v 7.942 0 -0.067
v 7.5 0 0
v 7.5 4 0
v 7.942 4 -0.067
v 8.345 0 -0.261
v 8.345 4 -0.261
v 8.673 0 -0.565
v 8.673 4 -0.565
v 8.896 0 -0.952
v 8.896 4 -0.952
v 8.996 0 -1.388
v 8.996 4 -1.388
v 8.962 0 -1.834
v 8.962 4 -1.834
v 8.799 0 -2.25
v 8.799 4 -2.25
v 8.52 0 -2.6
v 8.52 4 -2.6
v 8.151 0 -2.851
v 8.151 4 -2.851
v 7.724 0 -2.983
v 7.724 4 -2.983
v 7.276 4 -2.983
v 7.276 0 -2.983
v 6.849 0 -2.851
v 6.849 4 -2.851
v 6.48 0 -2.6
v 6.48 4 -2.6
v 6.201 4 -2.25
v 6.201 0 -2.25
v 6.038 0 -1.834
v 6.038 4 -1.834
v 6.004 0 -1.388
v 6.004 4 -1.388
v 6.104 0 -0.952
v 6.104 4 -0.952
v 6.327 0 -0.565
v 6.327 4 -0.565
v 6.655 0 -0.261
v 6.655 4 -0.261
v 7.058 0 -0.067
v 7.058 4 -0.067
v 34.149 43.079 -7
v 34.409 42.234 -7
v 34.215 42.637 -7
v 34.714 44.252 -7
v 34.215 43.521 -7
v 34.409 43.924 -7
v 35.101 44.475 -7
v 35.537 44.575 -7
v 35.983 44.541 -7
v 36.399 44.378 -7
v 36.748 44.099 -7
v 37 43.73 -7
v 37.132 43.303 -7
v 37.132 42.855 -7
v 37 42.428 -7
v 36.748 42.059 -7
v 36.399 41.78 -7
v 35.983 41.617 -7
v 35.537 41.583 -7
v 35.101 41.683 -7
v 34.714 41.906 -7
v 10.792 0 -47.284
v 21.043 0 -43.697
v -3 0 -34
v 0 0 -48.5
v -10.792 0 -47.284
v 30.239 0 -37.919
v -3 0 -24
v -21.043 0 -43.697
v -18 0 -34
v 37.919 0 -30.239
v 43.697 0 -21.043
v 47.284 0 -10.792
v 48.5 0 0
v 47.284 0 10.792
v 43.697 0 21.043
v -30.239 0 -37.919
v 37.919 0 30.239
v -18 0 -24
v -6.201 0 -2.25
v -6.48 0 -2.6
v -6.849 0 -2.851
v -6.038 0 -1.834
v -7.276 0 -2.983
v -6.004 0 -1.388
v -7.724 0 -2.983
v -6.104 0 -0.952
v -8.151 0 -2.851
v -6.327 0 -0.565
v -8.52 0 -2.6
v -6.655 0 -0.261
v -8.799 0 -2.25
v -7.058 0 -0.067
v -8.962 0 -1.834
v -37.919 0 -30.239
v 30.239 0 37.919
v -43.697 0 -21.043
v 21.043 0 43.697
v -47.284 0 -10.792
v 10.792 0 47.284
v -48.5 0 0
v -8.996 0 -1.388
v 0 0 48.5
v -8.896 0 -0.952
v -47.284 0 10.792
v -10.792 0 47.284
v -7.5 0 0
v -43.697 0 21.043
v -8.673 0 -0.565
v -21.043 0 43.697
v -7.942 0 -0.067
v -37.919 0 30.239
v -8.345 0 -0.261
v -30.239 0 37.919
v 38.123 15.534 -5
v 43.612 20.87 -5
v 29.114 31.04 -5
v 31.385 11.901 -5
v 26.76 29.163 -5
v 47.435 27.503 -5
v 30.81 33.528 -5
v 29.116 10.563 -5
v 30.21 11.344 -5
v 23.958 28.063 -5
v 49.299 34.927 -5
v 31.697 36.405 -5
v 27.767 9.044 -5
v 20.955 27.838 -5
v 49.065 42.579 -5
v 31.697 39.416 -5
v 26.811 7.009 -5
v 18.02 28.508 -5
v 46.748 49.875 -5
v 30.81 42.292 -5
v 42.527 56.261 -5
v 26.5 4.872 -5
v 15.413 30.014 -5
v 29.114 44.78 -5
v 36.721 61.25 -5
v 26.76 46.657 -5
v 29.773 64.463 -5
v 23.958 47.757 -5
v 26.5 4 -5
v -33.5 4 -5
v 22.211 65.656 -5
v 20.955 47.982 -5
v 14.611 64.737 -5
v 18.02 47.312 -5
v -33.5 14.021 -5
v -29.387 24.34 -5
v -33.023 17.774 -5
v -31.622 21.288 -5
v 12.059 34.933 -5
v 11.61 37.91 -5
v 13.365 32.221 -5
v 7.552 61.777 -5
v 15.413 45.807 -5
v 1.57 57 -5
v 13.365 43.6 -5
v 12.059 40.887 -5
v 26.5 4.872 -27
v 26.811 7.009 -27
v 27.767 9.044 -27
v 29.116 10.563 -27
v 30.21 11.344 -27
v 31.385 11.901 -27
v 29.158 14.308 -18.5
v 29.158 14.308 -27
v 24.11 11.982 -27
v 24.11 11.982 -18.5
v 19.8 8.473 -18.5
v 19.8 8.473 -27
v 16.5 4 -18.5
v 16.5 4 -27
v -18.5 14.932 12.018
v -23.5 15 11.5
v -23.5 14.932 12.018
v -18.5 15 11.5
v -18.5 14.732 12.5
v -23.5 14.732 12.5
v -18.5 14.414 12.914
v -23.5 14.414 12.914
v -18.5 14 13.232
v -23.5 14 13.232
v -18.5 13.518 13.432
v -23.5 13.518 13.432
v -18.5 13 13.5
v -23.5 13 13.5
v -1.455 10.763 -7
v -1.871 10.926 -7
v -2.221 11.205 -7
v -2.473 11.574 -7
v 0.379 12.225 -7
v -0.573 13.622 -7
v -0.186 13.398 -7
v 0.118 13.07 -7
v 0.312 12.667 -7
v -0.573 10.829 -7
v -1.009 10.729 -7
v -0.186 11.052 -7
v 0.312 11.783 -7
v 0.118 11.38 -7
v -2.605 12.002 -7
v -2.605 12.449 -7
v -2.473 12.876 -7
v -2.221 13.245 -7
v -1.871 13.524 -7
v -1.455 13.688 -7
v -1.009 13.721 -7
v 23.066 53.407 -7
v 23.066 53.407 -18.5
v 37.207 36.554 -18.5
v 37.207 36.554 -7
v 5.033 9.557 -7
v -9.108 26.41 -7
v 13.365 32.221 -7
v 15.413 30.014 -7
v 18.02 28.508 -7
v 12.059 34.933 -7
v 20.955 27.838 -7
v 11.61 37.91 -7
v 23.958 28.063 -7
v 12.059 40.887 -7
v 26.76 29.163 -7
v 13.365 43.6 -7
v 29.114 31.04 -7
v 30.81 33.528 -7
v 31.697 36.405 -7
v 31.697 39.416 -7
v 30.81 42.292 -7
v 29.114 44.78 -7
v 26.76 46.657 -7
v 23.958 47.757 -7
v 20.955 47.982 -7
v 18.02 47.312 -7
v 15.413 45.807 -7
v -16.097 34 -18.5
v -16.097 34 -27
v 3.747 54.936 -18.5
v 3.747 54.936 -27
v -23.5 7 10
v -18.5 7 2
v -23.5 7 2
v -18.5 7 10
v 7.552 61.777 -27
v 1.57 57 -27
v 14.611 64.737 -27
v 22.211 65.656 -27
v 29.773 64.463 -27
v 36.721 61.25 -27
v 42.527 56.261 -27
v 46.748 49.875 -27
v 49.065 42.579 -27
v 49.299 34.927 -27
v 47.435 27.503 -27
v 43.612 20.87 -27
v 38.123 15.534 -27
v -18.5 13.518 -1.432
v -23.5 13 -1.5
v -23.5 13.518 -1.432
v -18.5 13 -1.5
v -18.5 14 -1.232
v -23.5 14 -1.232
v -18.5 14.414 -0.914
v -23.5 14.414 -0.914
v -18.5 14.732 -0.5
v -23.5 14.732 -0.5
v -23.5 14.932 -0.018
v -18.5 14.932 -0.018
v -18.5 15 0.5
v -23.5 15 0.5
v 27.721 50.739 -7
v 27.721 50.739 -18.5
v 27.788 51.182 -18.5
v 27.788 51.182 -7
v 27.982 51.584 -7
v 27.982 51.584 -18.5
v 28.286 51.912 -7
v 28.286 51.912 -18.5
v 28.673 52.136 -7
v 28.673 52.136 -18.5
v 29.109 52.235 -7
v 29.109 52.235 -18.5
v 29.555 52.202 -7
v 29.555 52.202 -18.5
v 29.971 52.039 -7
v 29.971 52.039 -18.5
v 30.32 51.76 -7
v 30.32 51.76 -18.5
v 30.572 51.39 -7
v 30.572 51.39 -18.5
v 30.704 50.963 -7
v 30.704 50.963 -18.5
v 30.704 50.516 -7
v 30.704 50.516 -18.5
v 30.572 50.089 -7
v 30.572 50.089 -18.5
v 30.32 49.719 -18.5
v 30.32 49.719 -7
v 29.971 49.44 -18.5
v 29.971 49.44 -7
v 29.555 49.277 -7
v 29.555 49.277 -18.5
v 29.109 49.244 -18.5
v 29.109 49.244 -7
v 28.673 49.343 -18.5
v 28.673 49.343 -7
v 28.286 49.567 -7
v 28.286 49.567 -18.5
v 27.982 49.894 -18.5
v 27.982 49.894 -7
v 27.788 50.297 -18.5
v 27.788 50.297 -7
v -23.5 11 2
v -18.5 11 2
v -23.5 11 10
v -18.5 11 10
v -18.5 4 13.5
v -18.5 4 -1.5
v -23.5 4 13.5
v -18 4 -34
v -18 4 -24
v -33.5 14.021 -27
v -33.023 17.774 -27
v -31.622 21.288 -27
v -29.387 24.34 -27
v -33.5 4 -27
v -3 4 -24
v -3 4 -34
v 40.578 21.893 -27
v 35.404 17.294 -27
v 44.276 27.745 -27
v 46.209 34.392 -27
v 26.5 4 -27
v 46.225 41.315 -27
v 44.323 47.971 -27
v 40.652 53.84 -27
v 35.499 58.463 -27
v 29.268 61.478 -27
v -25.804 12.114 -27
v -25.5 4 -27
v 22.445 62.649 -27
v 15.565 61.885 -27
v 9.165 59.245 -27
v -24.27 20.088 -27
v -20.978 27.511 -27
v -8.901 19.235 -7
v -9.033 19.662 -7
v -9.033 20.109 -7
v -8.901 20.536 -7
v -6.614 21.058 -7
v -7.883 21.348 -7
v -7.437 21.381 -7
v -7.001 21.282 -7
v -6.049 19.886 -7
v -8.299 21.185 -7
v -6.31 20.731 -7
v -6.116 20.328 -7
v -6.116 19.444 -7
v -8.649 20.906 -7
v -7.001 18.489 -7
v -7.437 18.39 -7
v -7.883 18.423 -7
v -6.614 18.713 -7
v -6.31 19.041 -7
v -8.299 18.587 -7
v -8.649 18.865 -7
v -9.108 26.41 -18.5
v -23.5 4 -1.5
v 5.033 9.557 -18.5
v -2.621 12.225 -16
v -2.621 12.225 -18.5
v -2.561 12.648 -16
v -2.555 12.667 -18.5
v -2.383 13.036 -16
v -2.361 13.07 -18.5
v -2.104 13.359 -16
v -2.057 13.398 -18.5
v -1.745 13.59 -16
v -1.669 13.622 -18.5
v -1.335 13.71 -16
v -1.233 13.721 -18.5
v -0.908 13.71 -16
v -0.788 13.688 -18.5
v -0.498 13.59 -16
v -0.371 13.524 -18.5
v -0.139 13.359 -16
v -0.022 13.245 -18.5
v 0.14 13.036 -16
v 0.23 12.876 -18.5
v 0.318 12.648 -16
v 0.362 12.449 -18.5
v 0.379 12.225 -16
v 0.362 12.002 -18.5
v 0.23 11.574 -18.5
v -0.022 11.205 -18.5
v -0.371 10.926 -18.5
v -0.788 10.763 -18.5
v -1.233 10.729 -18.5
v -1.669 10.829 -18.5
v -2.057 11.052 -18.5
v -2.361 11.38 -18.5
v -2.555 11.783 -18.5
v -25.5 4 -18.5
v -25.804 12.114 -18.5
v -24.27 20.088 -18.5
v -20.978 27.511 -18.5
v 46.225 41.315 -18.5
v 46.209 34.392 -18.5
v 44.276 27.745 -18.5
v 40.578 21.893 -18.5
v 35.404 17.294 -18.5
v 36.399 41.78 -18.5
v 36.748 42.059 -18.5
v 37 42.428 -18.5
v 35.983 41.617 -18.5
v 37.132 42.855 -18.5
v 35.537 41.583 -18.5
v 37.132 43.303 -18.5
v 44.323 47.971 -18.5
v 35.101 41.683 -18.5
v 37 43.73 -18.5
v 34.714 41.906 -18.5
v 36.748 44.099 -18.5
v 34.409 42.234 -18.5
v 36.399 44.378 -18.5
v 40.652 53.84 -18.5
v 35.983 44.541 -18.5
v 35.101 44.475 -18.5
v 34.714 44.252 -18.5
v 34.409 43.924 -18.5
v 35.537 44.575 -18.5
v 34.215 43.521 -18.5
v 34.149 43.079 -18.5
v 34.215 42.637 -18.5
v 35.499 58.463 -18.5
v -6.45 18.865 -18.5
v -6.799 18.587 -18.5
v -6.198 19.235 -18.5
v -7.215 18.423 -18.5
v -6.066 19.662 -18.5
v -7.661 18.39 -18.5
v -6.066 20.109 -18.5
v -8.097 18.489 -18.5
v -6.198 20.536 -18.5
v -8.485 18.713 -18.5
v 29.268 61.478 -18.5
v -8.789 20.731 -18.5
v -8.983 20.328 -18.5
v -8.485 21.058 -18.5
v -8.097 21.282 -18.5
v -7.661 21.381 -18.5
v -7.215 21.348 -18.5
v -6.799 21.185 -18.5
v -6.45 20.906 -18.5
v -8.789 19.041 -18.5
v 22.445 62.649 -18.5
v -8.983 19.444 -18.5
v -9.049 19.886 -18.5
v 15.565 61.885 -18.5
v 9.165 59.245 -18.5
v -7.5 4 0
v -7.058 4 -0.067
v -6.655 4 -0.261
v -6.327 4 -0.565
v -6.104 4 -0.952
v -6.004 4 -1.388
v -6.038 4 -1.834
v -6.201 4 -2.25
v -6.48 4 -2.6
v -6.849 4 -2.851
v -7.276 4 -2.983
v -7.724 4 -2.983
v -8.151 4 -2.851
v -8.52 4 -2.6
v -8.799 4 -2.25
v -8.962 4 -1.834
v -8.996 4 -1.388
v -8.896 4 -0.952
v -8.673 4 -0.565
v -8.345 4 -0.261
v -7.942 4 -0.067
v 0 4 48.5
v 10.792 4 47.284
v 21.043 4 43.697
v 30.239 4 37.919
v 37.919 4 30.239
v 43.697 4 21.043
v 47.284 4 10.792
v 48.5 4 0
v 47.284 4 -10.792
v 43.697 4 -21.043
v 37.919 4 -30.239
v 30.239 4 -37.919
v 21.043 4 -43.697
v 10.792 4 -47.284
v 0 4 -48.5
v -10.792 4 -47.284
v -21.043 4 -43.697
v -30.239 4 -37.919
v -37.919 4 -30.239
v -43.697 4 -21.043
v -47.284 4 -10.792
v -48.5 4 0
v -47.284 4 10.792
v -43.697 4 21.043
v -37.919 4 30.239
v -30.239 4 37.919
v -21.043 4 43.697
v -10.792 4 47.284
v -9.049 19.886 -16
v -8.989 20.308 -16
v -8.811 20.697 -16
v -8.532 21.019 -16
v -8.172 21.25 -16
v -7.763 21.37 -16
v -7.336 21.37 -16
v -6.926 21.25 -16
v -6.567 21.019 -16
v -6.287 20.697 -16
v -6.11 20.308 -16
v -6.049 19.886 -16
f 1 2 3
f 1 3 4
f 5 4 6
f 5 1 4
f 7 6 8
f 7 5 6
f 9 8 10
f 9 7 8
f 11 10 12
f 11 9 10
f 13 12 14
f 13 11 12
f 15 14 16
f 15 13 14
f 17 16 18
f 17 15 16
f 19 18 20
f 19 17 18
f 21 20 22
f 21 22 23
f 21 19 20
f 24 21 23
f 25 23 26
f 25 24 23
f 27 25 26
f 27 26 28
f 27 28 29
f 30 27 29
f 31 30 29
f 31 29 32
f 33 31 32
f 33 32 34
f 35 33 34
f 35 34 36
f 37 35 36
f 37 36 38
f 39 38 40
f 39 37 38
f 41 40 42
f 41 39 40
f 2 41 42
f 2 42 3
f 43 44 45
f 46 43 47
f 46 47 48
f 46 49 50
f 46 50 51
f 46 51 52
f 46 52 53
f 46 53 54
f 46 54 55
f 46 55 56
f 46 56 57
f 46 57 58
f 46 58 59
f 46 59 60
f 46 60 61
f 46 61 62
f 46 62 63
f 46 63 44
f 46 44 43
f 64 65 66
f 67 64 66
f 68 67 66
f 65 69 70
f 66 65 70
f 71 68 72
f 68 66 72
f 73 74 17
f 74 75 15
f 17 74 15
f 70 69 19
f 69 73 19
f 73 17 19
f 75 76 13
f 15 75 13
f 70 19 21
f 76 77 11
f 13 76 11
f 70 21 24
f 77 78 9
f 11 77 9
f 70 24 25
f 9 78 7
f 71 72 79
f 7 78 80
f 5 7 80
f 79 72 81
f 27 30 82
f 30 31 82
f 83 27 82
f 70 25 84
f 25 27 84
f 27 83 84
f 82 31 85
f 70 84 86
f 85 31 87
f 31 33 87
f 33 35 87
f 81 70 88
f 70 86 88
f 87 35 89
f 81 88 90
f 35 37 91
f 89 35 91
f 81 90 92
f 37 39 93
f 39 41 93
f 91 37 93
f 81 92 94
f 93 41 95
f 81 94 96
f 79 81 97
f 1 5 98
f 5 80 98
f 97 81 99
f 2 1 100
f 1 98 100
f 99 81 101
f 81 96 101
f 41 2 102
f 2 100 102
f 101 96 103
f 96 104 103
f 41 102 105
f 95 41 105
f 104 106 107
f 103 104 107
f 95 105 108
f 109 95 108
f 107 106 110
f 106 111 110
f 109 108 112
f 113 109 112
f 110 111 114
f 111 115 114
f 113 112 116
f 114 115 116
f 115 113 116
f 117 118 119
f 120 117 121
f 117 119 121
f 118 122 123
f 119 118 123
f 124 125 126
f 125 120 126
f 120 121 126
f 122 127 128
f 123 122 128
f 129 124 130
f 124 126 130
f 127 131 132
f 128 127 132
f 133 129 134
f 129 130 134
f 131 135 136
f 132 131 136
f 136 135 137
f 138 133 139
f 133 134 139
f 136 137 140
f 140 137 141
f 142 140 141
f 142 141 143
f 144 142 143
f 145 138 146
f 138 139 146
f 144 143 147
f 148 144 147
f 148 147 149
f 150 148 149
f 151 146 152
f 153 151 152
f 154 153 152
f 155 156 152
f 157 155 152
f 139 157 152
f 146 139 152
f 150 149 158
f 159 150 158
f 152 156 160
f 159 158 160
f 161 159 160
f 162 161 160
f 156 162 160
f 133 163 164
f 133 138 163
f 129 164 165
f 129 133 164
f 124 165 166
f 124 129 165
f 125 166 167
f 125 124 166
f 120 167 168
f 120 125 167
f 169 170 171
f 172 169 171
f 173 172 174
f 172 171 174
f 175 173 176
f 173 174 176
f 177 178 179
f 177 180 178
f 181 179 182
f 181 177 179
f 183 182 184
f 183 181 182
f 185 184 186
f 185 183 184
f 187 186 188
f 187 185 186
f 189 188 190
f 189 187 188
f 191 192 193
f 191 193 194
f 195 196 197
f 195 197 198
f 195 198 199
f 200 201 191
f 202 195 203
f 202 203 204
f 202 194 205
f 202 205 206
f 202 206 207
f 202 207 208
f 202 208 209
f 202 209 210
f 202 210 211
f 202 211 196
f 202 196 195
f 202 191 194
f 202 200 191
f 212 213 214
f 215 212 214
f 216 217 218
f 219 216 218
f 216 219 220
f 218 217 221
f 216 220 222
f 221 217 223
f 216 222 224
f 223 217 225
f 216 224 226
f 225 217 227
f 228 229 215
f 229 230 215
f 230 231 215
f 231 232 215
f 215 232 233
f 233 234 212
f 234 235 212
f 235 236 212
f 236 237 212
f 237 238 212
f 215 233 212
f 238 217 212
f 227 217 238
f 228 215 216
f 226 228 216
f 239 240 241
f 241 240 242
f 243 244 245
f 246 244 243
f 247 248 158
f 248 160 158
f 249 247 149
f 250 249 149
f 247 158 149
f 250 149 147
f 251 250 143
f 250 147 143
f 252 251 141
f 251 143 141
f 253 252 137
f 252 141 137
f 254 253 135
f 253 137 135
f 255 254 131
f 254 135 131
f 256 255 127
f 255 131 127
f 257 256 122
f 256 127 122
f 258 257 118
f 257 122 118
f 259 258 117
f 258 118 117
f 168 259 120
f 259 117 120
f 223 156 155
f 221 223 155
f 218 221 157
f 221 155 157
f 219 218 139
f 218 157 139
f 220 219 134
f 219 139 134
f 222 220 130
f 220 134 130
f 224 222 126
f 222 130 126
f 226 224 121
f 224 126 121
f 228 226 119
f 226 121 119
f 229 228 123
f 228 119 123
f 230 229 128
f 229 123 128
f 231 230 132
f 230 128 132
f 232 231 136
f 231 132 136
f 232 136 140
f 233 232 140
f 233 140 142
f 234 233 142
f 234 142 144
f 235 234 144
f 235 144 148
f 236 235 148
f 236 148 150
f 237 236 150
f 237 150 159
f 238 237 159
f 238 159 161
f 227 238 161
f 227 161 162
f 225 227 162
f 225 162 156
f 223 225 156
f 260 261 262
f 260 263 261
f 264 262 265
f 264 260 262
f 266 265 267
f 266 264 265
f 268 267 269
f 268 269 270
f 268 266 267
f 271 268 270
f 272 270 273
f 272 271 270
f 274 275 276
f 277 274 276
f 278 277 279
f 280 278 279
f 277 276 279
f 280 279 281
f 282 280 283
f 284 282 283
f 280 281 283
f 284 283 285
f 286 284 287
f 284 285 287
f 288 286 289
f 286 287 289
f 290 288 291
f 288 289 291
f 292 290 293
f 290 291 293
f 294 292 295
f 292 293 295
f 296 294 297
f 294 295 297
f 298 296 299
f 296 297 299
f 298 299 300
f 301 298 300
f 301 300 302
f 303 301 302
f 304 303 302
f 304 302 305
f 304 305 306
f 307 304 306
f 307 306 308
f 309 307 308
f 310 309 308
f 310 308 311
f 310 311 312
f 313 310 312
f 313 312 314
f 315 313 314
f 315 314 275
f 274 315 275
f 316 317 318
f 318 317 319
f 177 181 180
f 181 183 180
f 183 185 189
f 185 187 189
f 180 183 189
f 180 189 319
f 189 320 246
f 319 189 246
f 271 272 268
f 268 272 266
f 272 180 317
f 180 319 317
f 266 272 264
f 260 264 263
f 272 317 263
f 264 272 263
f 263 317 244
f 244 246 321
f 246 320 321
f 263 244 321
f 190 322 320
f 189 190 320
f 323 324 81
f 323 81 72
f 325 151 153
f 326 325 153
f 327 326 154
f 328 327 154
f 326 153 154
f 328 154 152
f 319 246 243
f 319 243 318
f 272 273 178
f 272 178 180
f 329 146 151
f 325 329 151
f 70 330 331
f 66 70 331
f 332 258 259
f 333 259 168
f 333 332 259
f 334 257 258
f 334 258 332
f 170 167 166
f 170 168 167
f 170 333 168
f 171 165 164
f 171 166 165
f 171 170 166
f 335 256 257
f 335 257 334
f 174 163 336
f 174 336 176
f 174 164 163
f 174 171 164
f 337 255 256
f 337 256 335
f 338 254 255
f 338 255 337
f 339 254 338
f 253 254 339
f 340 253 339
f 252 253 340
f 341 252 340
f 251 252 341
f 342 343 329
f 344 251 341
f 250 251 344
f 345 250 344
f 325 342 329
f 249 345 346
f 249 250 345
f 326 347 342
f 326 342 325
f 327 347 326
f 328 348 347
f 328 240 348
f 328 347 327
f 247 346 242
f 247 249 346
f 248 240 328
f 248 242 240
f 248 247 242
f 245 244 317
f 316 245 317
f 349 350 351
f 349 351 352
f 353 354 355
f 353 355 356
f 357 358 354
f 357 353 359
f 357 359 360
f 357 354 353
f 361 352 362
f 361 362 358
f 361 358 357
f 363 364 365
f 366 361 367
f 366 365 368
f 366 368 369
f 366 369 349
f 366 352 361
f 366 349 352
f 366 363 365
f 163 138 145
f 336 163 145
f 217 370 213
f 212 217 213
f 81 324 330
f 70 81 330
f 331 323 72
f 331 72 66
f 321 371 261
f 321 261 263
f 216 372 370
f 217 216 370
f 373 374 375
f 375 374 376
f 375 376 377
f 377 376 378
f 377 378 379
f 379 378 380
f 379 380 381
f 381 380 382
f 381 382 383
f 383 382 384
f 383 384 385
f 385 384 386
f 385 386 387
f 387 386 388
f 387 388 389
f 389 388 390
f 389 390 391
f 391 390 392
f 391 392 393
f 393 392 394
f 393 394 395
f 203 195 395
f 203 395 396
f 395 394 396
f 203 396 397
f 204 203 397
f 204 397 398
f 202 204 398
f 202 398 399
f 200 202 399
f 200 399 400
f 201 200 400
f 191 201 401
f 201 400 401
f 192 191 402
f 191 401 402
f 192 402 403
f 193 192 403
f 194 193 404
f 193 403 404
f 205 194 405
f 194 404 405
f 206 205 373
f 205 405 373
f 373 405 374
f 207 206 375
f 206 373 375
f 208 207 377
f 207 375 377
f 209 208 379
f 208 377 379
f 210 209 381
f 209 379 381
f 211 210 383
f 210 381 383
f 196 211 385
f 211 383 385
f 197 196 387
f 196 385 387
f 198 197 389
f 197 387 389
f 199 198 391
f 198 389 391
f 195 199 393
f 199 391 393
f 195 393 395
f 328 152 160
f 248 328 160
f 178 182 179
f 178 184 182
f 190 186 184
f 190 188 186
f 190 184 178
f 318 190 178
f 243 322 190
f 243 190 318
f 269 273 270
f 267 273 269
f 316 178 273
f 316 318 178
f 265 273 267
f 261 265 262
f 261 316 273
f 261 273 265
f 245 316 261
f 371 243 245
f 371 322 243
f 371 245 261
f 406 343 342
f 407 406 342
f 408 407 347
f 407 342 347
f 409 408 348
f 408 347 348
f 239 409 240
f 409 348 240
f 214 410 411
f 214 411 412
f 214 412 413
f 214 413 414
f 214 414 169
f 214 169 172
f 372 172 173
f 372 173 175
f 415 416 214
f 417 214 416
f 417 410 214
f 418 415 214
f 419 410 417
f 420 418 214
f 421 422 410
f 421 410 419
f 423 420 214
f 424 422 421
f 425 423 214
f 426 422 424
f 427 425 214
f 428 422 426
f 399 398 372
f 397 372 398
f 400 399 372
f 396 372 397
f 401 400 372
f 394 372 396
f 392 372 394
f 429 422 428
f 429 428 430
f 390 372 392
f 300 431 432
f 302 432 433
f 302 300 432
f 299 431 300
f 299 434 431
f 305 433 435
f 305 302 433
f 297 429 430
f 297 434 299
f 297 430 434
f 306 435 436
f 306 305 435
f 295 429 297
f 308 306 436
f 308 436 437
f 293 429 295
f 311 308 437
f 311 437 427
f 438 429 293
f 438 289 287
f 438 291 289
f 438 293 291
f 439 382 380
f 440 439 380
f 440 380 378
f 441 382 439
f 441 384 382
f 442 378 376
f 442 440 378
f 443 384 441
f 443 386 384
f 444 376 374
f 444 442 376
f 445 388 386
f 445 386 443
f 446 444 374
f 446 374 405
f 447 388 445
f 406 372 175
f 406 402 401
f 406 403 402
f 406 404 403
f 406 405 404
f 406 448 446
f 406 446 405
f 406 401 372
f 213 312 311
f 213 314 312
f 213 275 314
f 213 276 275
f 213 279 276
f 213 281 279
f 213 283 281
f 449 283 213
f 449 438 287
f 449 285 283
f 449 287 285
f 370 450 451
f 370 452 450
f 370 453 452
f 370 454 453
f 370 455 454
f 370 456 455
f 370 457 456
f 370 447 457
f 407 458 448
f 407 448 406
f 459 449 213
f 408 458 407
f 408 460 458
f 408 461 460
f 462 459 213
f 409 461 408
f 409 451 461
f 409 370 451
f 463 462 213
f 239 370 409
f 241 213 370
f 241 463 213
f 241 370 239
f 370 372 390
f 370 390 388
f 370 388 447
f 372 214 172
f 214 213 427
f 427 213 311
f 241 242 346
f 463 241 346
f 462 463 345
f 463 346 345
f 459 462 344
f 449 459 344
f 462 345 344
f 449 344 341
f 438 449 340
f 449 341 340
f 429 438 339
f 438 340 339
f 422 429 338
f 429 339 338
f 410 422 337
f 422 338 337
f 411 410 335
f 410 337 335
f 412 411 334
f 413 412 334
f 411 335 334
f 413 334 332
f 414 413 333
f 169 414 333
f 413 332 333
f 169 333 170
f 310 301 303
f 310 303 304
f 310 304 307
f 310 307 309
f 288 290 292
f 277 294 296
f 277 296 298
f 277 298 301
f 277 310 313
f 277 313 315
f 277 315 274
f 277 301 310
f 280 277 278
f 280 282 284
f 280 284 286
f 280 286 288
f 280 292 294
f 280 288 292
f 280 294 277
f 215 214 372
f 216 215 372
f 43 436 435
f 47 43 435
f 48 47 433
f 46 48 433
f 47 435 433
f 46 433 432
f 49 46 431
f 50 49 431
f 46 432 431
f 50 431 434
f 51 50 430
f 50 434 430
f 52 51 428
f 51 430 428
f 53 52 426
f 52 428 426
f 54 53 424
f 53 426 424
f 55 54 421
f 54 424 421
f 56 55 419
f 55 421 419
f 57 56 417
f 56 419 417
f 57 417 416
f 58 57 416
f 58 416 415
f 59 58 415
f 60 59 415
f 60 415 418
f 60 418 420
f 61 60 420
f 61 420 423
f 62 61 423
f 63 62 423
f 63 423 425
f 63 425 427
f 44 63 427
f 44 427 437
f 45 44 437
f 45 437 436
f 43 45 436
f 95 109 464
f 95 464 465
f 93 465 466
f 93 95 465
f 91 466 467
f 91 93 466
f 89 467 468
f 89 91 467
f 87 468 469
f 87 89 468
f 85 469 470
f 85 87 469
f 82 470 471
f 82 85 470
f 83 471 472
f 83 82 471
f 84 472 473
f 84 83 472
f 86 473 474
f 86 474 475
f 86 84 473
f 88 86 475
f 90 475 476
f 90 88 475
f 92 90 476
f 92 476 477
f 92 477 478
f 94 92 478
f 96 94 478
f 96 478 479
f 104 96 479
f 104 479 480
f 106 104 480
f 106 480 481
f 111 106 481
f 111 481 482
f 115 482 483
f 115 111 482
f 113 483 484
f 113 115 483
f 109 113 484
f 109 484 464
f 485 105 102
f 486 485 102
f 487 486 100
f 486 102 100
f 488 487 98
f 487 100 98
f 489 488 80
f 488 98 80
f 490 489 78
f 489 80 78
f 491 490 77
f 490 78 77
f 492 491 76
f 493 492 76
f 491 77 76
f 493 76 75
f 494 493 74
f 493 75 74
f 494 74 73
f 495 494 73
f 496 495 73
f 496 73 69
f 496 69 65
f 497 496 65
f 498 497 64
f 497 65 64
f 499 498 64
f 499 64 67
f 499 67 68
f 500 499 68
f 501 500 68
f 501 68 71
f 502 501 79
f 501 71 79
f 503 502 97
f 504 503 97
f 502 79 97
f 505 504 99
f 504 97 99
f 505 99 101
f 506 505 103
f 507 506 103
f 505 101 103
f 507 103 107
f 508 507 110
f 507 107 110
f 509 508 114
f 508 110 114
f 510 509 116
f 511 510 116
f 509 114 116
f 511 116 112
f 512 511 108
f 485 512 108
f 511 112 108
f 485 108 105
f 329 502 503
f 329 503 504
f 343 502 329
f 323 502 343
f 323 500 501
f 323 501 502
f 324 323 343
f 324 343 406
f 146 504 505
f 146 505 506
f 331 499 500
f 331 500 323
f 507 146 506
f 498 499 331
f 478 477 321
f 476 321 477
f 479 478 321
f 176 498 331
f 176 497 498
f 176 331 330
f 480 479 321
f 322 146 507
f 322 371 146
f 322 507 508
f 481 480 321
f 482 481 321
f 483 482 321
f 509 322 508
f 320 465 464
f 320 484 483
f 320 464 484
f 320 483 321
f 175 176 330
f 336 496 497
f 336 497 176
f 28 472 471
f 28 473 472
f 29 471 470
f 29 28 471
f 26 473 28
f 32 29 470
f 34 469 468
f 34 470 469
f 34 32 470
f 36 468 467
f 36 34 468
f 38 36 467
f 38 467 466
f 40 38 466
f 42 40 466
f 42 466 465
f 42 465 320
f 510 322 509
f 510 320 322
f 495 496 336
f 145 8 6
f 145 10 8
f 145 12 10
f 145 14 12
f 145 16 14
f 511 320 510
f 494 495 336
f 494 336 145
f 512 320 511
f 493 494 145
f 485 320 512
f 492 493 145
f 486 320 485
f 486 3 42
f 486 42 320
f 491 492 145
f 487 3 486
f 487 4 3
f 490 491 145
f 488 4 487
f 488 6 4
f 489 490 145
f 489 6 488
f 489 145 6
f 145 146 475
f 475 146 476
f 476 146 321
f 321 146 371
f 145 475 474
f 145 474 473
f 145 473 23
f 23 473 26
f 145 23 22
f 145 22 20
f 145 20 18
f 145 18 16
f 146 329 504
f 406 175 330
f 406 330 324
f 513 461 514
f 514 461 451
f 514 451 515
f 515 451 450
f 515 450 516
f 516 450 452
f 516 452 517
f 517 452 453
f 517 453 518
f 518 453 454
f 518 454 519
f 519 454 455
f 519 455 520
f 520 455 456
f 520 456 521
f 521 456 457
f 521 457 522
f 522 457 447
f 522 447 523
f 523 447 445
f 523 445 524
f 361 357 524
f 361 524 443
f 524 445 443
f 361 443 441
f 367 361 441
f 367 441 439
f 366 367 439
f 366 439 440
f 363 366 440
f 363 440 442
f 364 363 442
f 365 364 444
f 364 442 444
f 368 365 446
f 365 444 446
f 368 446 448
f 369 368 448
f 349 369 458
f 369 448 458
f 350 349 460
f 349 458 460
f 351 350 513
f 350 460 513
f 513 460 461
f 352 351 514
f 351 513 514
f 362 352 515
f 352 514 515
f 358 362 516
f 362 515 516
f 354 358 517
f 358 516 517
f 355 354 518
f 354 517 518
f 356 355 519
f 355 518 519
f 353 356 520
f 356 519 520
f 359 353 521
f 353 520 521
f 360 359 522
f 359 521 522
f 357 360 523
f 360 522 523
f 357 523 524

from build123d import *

# Parameters (mm, degrees)
SKETCH1_R               = 48.5
SKETCH1_R_2             = 1.5
SKETCH1_W               = 5
SKETCH1_H               = 15
BOSS_EXTRUDE1_DEPTH     = 4
SKETCH1_4_W             = 5
SKETCH1_4_H             = 15
BOSS_EXTRUDE2_DEPTH     = 15
FILLET1_R               = 2
EXTRUDE_THIN1_DEPTH     = 11
BOSS_EXTRUDE3_START     = 11
SKETCH3_4_R             = 10.1
BOSS_EXTRUDE3_DEPTH     = 11
CUT_EXTRUDE2_DEPTH      = 11
SKETCH8_R               = 1.5
CUT_EXTRUDE3_DEPTH      = 9
CUT_EXTRUDE4_DEPTH      = 110.483799158
CUT_EXTRUDE4_DEPTH_BACK = 110.483799158
SKETCH9_W               = 8
SKETCH9_H               = 4
SKETCH10_W              = 15
SKETCH10_H              = 10
CUT_EXTRUDE5_DEPTH      = 93.739106768
FILLET2_R               = 7.5
BOSS_EXTRUDE4_START     = 2.5
SKETCH11_R              = 1.5
BOSS_EXTRUDE4_DEPTH     = 2.5


with BuildPart() as part:
    # Sketch1 → Boss-Extrude1 (new body)
    with BuildSketch(Plane(origin=(0, 0, 0), x_dir=(1, 0, 0), z_dir=(0, 1, 0))):
        with Locations(Location((0, 0, 0), (0, 0, 270))):
            Circle(SKETCH1_R)
        with Locations(Location((7.5, 1.5, 0), (0, 0, 270))):
            Circle(SKETCH1_R_2, mode=Mode.SUBTRACT)
        with Locations(Location((-7.5, 1.5, 0), (0, 0, 270))):
            Circle(SKETCH1_R_2, mode=Mode.SUBTRACT)
        with Locations((-21, -6)):
            Rectangle(SKETCH1_W, SKETCH1_H, mode=Mode.SUBTRACT)
    extrude(amount=BOSS_EXTRUDE1_DEPTH)

    # Sketch1<4> → Boss-Extrude2 (add)
    with BuildSketch(Plane(origin=(0, 0, 0), x_dir=(1, 0, 0), z_dir=(0, 1, 0))):
        with Locations((-21, -6)):
            Rectangle(SKETCH1_4_W, SKETCH1_4_H)
    extrude(amount=BOSS_EXTRUDE2_DEPTH)

    # Fillet1
    fillet1_edges = [part.edges().sort_by_distance(p)[0] for p in [
        (-21, 15, -1.5),
        (-21, 15, 13.5),
    ]]
    fillet(fillet1_edges, radius=FILLET1_R)

    # Sketch3 → Extrude-Thin1 (add, symmetric)
    with BuildSketch(Plane.XY.offset(-16)):
        with BuildLine():
            Line((-33.5, 0), (-33.5, 14.02081119))
            ThreePointArc((-33.5, 14.02081119), (-32.433806578, 19.575001882), (-29.386795435, 24.339613696))
            Line((-29.386795435, 24.339613696), (1.569612084, 57))
            ThreePointArc((1.569612084, 57), (45.23729846, 52.625424101), (30.061304851, 11.446631432))
            ThreePointArc((30.061304851, 11.446631432), (28.251643763, 10.794728993), (26.5, 10))
            Line((26.5, 10), (26.5, 0))
            Line((26.5, 0), (16.5, 0))
            Line((16.5, 0), (16.5, 15.467006733))
            ThreePointArc((16.5, 15.467006733), (21.532603297, 18.690532933), (27.051891801, 20.983058074))
            ThreePointArc((27.051891801, 20.983058074), (36.759058885, 47.322646177), (8.827475707, 50.120798329))
            Line((8.827475707, 50.120798329), (-22.128931812, 17.460412025))
            ThreePointArc((-22.128931812, 17.460412025), (-23.144602193, 15.872208087), (-23.5, 14.02081119))
            Line((-23.5, 14.02081119), (-23.5, 0))
            Line((-23.5, 0), (-33.5, 0))
        make_face()
    extrude(amount=EXTRUDE_THIN1_DEPTH, both=True)

    # Sketch3<4> → Boss-Extrude3 (add)
    with BuildSketch(Plane.XY.offset(-16).offset(BOSS_EXTRUDE3_START)):
        with BuildLine():
            Line((-33.5, 0), (-33.5, 14.02081119))
            ThreePointArc((-33.5, 14.02081119), (-32.433806578, 19.575001882), (-29.386795435, 24.339613696))
            Line((-29.386795435, 24.339613696), (1.569612084, 57))
            ThreePointArc((1.569612084, 57), (45.23729846, 52.625424101), (30.061304851, 11.446631432))
            ThreePointArc((30.061304851, 11.446631432), (28.251643763, 10.794728993), (26.5, 10))
            Line((26.5, 10), (26.5, 0))
            Line((26.5, 0), (-33.5, 0))
        make_face()
        with Locations(Location((21.710183638, 37.910215363, 0), (0, 0, 180))):
            Circle(SKETCH3_4_R, mode=Mode.SUBTRACT)
    extrude(amount=-BOSS_EXTRUDE3_DEPTH)

    # Sketch5 → Cut-Extrude2 (cut)
    with BuildSketch(Plane(origin=(0, 0, -27), x_dir=(-1, 0, 0), z_dir=(0, 0, -1))):
        with BuildLine():
            Line((-16.5, 4), (25.5, 4))
            ThreePointArc((25.5, 4), (24.270182893, 20.088149503), (16.096969308, 34))
            Line((16.096969308, 34), (-3.746971171, 54.936239499))
            ThreePointArc((-3.746971171, 54.936239499), (-42.693826587, 51.034590724), (-29.158480936, 14.307559424))
            ThreePointArc((-29.158480936, 14.307559424), (-21.844187603, 10.363500889), (-16.5, 4))
        make_face()
    extrude(amount=-CUT_EXTRUDE2_DEPTH, mode=Mode.SUBTRACT)

    # Sketch8 → Cut-Extrude3 (cut)
    with BuildSketch(Plane(origin=(0, 0, -16), x_dir=(-1, 0, 0), z_dir=(0, 0, -1))):
        with Locations((-35.648743891, 43.079019683)):
            Circle(SKETCH8_R)
        with Locations((-29.220867794, 50.739464115)):
            Circle(SKETCH8_R)
        with Locations(Location((7.549265476, 19.88565885, 0), (0, 0, 180))):
            Circle(SKETCH8_R)
        with Locations(Location((1.121389379, 12.225214418, 0), (0, 0, 180))):
            Circle(SKETCH8_R)
        Polygon((-37.207336219, 36.554390196), (-23.066008806, 53.407367944), (9.107857805, 26.410288337), (-5.033469608, 9.557310589), align=None)
    extrude(amount=-CUT_EXTRUDE3_DEPTH, mode=Mode.SUBTRACT)

    # Sketch9 → Cut-Extrude4 (cut, two sides: drawn at the far end of the back side and taken through both)
    with BuildSketch(Plane.ZY.offset(23.5).offset(-CUT_EXTRUDE4_DEPTH_BACK)):
        with Locations((6, 9)):
            Rectangle(SKETCH9_W, SKETCH9_H)
    extrude(amount=CUT_EXTRUDE4_DEPTH + CUT_EXTRUDE4_DEPTH_BACK, mode=Mode.SUBTRACT)

    # Sketch10 → Cut-Extrude5 (cut, through all)
    with BuildSketch(Plane(origin=(0, 4, 0), x_dir=(1, 0, 0), z_dir=(0, 1, 0))):
        with Locations((-10.5, 29)):
            Rectangle(SKETCH10_W, SKETCH10_H)
    extrude(amount=-CUT_EXTRUDE5_DEPTH, mode=Mode.SUBTRACT)

    # Fillet2
    fillet2_edges = [part.edges().sort_by_distance(p)[0] for p in [
        (26.5, 10, -16),
    ]]
    fillet(fillet2_edges, radius=FILLET2_R)

    # Sketch11 → Boss-Extrude4 (add)
    with BuildSketch(Plane(origin=(0, 0, -16), x_dir=(-1, 0, 0), z_dir=(0, 0, -1)).offset(BOSS_EXTRUDE4_START)):
        with BuildLine():
            Line((-16.5, 4), (25.5, 4))
            ThreePointArc((25.5, 4), (24.270182893, 20.088149503), (16.096969308, 34))
            Line((16.096969308, 34), (-3.746971171, 54.936239499))
            ThreePointArc((-3.746971171, 54.936239499), (-42.693826587, 51.034590724), (-29.158480936, 14.307559424))
            ThreePointArc((-29.158480936, 14.307559424), (-21.844187603, 10.363500889), (-16.5, 4))
        make_face()
        with Locations((1.121389379, 12.225214418)):
            Circle(SKETCH11_R, mode=Mode.SUBTRACT)
        with Locations((7.549265476, 19.88565885)):
            Circle(SKETCH11_R, mode=Mode.SUBTRACT)
        with Locations((-35.648743891, 43.079019683)):
            Circle(SKETCH11_R, mode=Mode.SUBTRACT)
        with Locations((-29.220867794, 50.739464115)):
            Circle(SKETCH11_R, mode=Mode.SUBTRACT)
        Polygon((-5.033469608, 9.557310589), (9.107857805, 26.410288337), (-23.066008806, 53.407367944), (-37.207336219, 36.554390196), align=None, mode=Mode.SUBTRACT)
    extrude(amount=-BOSS_EXTRUDE4_DEPTH)


solid = part.part
